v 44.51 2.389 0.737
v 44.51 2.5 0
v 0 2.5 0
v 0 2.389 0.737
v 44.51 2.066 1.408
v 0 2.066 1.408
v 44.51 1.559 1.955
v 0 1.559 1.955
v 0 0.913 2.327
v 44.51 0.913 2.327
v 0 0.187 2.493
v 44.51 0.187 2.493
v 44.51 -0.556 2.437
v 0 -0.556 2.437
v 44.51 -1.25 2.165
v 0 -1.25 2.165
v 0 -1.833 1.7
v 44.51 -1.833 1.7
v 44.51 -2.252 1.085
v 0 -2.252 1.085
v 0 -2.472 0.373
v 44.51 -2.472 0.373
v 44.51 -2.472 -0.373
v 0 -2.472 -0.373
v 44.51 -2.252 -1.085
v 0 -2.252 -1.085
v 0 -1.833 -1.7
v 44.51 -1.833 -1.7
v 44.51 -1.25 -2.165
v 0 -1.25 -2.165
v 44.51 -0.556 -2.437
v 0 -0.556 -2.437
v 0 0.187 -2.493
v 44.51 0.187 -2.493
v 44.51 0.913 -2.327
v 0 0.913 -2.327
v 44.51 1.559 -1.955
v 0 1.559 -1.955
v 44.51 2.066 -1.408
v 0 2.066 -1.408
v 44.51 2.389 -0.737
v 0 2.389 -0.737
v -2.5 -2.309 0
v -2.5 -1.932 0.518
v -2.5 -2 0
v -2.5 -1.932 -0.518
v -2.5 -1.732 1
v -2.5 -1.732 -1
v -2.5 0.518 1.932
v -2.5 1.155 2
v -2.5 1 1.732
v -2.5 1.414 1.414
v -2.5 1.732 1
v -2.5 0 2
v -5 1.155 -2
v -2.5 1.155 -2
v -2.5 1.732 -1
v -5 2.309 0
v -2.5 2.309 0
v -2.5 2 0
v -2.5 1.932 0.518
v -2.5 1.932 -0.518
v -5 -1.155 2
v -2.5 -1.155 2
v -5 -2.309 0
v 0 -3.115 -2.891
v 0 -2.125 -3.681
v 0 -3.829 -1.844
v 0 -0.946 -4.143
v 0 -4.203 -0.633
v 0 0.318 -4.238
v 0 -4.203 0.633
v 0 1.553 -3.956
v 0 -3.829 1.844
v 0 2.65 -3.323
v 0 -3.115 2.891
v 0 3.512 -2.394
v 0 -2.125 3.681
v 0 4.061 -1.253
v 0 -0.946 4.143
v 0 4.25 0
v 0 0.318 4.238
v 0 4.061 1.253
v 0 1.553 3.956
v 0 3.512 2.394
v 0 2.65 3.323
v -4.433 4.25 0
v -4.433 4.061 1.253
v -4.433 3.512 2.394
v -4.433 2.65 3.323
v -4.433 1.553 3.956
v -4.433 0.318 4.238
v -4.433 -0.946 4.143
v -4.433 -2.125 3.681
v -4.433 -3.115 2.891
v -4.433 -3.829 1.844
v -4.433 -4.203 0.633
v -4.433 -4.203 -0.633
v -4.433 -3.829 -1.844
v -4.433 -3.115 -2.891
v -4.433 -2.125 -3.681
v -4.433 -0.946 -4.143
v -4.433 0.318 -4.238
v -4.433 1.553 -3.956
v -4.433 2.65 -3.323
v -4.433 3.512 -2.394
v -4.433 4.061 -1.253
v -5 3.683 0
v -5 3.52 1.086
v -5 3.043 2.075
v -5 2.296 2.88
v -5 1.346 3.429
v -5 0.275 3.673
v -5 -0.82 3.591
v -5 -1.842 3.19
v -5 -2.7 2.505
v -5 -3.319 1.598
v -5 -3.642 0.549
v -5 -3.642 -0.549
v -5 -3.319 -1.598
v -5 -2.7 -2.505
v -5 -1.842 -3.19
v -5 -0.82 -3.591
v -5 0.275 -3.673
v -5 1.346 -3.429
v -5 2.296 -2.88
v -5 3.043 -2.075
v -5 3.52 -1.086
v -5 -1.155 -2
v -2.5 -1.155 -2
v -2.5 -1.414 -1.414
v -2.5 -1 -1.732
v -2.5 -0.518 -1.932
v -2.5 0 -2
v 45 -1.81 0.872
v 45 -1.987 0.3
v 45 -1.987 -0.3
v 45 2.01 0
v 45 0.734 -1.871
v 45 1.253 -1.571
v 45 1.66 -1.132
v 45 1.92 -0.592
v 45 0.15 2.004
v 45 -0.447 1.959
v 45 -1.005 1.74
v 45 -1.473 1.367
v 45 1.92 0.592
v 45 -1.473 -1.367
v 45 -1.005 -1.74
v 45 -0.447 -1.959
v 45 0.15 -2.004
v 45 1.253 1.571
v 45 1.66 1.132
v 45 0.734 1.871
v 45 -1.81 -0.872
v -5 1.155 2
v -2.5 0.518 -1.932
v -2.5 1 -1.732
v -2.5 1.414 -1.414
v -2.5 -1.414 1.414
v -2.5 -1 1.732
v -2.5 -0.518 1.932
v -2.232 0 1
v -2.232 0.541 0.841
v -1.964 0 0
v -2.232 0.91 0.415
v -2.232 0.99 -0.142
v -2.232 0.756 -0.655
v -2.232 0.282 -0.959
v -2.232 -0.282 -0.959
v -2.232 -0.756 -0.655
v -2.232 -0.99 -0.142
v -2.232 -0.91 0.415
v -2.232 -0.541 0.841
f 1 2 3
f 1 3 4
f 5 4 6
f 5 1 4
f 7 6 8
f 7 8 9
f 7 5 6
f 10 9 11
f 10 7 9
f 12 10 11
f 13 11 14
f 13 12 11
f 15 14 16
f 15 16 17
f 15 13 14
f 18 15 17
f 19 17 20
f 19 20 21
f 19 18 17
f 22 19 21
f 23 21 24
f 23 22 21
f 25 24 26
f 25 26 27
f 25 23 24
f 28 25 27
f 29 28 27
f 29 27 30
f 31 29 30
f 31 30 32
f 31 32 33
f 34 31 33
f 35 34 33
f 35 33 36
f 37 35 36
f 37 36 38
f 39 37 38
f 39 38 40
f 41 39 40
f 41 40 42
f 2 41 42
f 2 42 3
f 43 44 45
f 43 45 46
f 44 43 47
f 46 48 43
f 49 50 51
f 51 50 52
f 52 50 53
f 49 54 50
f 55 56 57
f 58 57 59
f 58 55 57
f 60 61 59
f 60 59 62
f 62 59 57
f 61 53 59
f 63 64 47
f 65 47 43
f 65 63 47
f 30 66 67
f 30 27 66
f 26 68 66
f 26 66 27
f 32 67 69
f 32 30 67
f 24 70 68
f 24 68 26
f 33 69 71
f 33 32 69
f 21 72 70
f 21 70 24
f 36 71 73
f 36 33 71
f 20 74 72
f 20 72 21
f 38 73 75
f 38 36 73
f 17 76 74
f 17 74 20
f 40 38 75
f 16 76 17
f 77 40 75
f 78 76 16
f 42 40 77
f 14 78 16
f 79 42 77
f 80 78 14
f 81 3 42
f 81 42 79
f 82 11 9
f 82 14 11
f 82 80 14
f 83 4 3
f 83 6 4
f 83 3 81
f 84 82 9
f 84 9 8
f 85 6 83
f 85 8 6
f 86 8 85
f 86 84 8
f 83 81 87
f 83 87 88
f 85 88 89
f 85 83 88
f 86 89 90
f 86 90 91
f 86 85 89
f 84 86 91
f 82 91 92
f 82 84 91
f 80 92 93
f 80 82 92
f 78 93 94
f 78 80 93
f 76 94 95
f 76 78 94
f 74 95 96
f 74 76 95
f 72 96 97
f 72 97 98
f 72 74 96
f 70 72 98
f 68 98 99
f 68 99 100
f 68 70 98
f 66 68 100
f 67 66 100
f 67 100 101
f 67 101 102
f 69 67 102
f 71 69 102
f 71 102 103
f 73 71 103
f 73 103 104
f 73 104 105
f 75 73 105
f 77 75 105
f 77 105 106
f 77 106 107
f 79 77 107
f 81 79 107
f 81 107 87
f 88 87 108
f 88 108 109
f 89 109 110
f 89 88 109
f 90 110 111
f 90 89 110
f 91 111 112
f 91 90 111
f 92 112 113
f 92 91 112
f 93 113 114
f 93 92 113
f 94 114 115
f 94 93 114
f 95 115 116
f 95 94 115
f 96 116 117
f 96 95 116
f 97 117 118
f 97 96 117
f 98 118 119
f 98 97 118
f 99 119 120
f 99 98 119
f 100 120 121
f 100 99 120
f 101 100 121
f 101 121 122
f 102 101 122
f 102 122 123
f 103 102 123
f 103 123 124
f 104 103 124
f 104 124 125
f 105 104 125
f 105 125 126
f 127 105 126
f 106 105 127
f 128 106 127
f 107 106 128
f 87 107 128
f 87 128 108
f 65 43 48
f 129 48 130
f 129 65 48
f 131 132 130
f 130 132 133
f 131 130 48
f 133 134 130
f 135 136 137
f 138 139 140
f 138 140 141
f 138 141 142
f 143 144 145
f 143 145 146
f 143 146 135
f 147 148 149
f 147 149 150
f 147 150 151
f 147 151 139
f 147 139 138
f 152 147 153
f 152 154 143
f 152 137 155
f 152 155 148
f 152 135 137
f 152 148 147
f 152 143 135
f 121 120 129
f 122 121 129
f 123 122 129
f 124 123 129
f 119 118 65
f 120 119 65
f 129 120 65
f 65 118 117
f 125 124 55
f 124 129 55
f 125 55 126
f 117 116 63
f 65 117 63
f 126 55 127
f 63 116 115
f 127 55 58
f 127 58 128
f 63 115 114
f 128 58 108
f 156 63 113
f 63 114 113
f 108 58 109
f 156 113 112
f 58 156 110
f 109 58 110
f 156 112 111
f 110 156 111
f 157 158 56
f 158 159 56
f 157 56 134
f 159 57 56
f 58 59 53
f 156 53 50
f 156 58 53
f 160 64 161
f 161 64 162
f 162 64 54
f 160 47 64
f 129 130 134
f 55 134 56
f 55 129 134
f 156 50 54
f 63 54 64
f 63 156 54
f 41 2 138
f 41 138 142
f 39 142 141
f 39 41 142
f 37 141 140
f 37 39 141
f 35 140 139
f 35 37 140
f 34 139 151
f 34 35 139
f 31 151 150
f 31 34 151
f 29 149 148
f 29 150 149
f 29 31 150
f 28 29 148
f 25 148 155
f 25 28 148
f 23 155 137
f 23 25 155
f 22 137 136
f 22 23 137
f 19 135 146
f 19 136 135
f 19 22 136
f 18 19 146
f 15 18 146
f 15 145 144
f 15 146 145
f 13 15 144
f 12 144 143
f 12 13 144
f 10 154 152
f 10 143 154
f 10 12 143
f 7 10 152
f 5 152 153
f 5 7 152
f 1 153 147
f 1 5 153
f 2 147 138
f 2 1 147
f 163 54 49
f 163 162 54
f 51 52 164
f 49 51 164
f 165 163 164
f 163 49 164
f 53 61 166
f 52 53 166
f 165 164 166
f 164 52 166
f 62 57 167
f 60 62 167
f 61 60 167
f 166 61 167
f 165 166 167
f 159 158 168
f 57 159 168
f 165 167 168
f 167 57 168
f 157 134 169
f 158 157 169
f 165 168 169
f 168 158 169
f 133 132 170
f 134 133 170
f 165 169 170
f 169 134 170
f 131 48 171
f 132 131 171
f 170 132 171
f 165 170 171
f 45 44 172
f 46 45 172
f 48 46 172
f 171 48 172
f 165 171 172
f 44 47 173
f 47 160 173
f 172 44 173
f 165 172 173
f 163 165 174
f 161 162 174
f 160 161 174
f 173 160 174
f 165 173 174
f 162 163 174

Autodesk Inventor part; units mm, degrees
sketch "Sketch_2" plane through (0, 0, 0) normal (0, 0, 1) x (1, 0, 0)
  line L0 (45, 0) -> (-5, 0)
  line L1 (-5, 0) -> (-5, 3.6833)
  line L2 (-5, 3.6833) -> (-4.4333, 4.25)
  line L3 (-4.4333, 4.25) -> (0, 4.25)
  line L4 (0, 4.25) -> (0, 2.5)
  line L5 (0, 2.5) -> (44.5095, 2.5)
  line L6 (44.5095, 2.5) -> (45, 2.0095)
  line L7 (45, 2.0095) -> (45, 0)
  line L8 (45, 0) -> (-5, 0)
revolve "Revolution1" add sketch "Sketch_2" angle 360 about axis through (45, 0, 0) along (1, 0, 0)
thread "Thread1" size "M5x0.8" class "6g" standard "ISO Metric profile" length 21.5095
sketch "Sketch2" plane through (-5, 0, 0) normal (-1, 0, 0) x (0, 0, 1)
  point P0 (0, 0)
hole "Hole1" at (-5, 0, 0) direction (1, 0, 0) diameter 4 depth 2.5 tip angle 150
sketch "Sketch_3" plane through (-5, 0, 0) normal (1, 0, 0) x (0, 0, -1)
  line L0 (-2, -1.1547) -> (0, -2.3094)
  line L1 (0, -2.3094) -> (2, -1.1547)
  line L2 (2, -1.1547) -> (2, 1.1547)
  line L3 (2, 1.1547) -> (0, 2.3094)
  line L4 (0, 2.3094) -> (-2, 1.1547)
  line L5 (-2, 1.1547) -> (-2, -1.1547)
extrude "Extrusion1" cut sketch "Sketch_3" along normal blind 2.5
ref_plane "bolt_XY" through (0, 0, 0) normal (1, 0, 0) x (0, 0, -1)
ref_plane "bolt_YZ" through (0, 0, 0) normal (0, 0, -1) x (0, 1, 0)
ref_plane "bolt_ZX" through (0, 0, 0) normal (0, 1, 0) x (1, 0, 0)
ref_plane "nut_XY" through (45, 0, 0) normal (1, 0, 0) x (0, 0, -1)
ref_plane "nut_YZ" through (45, 0, 0) normal (0, 0, -1) x (0, 1, 0)
ref_plane "nut_ZX" through (45, 0, 0) normal (0, 1, 0) x (1, 0, 0)
properties part number "SCB5-45"
